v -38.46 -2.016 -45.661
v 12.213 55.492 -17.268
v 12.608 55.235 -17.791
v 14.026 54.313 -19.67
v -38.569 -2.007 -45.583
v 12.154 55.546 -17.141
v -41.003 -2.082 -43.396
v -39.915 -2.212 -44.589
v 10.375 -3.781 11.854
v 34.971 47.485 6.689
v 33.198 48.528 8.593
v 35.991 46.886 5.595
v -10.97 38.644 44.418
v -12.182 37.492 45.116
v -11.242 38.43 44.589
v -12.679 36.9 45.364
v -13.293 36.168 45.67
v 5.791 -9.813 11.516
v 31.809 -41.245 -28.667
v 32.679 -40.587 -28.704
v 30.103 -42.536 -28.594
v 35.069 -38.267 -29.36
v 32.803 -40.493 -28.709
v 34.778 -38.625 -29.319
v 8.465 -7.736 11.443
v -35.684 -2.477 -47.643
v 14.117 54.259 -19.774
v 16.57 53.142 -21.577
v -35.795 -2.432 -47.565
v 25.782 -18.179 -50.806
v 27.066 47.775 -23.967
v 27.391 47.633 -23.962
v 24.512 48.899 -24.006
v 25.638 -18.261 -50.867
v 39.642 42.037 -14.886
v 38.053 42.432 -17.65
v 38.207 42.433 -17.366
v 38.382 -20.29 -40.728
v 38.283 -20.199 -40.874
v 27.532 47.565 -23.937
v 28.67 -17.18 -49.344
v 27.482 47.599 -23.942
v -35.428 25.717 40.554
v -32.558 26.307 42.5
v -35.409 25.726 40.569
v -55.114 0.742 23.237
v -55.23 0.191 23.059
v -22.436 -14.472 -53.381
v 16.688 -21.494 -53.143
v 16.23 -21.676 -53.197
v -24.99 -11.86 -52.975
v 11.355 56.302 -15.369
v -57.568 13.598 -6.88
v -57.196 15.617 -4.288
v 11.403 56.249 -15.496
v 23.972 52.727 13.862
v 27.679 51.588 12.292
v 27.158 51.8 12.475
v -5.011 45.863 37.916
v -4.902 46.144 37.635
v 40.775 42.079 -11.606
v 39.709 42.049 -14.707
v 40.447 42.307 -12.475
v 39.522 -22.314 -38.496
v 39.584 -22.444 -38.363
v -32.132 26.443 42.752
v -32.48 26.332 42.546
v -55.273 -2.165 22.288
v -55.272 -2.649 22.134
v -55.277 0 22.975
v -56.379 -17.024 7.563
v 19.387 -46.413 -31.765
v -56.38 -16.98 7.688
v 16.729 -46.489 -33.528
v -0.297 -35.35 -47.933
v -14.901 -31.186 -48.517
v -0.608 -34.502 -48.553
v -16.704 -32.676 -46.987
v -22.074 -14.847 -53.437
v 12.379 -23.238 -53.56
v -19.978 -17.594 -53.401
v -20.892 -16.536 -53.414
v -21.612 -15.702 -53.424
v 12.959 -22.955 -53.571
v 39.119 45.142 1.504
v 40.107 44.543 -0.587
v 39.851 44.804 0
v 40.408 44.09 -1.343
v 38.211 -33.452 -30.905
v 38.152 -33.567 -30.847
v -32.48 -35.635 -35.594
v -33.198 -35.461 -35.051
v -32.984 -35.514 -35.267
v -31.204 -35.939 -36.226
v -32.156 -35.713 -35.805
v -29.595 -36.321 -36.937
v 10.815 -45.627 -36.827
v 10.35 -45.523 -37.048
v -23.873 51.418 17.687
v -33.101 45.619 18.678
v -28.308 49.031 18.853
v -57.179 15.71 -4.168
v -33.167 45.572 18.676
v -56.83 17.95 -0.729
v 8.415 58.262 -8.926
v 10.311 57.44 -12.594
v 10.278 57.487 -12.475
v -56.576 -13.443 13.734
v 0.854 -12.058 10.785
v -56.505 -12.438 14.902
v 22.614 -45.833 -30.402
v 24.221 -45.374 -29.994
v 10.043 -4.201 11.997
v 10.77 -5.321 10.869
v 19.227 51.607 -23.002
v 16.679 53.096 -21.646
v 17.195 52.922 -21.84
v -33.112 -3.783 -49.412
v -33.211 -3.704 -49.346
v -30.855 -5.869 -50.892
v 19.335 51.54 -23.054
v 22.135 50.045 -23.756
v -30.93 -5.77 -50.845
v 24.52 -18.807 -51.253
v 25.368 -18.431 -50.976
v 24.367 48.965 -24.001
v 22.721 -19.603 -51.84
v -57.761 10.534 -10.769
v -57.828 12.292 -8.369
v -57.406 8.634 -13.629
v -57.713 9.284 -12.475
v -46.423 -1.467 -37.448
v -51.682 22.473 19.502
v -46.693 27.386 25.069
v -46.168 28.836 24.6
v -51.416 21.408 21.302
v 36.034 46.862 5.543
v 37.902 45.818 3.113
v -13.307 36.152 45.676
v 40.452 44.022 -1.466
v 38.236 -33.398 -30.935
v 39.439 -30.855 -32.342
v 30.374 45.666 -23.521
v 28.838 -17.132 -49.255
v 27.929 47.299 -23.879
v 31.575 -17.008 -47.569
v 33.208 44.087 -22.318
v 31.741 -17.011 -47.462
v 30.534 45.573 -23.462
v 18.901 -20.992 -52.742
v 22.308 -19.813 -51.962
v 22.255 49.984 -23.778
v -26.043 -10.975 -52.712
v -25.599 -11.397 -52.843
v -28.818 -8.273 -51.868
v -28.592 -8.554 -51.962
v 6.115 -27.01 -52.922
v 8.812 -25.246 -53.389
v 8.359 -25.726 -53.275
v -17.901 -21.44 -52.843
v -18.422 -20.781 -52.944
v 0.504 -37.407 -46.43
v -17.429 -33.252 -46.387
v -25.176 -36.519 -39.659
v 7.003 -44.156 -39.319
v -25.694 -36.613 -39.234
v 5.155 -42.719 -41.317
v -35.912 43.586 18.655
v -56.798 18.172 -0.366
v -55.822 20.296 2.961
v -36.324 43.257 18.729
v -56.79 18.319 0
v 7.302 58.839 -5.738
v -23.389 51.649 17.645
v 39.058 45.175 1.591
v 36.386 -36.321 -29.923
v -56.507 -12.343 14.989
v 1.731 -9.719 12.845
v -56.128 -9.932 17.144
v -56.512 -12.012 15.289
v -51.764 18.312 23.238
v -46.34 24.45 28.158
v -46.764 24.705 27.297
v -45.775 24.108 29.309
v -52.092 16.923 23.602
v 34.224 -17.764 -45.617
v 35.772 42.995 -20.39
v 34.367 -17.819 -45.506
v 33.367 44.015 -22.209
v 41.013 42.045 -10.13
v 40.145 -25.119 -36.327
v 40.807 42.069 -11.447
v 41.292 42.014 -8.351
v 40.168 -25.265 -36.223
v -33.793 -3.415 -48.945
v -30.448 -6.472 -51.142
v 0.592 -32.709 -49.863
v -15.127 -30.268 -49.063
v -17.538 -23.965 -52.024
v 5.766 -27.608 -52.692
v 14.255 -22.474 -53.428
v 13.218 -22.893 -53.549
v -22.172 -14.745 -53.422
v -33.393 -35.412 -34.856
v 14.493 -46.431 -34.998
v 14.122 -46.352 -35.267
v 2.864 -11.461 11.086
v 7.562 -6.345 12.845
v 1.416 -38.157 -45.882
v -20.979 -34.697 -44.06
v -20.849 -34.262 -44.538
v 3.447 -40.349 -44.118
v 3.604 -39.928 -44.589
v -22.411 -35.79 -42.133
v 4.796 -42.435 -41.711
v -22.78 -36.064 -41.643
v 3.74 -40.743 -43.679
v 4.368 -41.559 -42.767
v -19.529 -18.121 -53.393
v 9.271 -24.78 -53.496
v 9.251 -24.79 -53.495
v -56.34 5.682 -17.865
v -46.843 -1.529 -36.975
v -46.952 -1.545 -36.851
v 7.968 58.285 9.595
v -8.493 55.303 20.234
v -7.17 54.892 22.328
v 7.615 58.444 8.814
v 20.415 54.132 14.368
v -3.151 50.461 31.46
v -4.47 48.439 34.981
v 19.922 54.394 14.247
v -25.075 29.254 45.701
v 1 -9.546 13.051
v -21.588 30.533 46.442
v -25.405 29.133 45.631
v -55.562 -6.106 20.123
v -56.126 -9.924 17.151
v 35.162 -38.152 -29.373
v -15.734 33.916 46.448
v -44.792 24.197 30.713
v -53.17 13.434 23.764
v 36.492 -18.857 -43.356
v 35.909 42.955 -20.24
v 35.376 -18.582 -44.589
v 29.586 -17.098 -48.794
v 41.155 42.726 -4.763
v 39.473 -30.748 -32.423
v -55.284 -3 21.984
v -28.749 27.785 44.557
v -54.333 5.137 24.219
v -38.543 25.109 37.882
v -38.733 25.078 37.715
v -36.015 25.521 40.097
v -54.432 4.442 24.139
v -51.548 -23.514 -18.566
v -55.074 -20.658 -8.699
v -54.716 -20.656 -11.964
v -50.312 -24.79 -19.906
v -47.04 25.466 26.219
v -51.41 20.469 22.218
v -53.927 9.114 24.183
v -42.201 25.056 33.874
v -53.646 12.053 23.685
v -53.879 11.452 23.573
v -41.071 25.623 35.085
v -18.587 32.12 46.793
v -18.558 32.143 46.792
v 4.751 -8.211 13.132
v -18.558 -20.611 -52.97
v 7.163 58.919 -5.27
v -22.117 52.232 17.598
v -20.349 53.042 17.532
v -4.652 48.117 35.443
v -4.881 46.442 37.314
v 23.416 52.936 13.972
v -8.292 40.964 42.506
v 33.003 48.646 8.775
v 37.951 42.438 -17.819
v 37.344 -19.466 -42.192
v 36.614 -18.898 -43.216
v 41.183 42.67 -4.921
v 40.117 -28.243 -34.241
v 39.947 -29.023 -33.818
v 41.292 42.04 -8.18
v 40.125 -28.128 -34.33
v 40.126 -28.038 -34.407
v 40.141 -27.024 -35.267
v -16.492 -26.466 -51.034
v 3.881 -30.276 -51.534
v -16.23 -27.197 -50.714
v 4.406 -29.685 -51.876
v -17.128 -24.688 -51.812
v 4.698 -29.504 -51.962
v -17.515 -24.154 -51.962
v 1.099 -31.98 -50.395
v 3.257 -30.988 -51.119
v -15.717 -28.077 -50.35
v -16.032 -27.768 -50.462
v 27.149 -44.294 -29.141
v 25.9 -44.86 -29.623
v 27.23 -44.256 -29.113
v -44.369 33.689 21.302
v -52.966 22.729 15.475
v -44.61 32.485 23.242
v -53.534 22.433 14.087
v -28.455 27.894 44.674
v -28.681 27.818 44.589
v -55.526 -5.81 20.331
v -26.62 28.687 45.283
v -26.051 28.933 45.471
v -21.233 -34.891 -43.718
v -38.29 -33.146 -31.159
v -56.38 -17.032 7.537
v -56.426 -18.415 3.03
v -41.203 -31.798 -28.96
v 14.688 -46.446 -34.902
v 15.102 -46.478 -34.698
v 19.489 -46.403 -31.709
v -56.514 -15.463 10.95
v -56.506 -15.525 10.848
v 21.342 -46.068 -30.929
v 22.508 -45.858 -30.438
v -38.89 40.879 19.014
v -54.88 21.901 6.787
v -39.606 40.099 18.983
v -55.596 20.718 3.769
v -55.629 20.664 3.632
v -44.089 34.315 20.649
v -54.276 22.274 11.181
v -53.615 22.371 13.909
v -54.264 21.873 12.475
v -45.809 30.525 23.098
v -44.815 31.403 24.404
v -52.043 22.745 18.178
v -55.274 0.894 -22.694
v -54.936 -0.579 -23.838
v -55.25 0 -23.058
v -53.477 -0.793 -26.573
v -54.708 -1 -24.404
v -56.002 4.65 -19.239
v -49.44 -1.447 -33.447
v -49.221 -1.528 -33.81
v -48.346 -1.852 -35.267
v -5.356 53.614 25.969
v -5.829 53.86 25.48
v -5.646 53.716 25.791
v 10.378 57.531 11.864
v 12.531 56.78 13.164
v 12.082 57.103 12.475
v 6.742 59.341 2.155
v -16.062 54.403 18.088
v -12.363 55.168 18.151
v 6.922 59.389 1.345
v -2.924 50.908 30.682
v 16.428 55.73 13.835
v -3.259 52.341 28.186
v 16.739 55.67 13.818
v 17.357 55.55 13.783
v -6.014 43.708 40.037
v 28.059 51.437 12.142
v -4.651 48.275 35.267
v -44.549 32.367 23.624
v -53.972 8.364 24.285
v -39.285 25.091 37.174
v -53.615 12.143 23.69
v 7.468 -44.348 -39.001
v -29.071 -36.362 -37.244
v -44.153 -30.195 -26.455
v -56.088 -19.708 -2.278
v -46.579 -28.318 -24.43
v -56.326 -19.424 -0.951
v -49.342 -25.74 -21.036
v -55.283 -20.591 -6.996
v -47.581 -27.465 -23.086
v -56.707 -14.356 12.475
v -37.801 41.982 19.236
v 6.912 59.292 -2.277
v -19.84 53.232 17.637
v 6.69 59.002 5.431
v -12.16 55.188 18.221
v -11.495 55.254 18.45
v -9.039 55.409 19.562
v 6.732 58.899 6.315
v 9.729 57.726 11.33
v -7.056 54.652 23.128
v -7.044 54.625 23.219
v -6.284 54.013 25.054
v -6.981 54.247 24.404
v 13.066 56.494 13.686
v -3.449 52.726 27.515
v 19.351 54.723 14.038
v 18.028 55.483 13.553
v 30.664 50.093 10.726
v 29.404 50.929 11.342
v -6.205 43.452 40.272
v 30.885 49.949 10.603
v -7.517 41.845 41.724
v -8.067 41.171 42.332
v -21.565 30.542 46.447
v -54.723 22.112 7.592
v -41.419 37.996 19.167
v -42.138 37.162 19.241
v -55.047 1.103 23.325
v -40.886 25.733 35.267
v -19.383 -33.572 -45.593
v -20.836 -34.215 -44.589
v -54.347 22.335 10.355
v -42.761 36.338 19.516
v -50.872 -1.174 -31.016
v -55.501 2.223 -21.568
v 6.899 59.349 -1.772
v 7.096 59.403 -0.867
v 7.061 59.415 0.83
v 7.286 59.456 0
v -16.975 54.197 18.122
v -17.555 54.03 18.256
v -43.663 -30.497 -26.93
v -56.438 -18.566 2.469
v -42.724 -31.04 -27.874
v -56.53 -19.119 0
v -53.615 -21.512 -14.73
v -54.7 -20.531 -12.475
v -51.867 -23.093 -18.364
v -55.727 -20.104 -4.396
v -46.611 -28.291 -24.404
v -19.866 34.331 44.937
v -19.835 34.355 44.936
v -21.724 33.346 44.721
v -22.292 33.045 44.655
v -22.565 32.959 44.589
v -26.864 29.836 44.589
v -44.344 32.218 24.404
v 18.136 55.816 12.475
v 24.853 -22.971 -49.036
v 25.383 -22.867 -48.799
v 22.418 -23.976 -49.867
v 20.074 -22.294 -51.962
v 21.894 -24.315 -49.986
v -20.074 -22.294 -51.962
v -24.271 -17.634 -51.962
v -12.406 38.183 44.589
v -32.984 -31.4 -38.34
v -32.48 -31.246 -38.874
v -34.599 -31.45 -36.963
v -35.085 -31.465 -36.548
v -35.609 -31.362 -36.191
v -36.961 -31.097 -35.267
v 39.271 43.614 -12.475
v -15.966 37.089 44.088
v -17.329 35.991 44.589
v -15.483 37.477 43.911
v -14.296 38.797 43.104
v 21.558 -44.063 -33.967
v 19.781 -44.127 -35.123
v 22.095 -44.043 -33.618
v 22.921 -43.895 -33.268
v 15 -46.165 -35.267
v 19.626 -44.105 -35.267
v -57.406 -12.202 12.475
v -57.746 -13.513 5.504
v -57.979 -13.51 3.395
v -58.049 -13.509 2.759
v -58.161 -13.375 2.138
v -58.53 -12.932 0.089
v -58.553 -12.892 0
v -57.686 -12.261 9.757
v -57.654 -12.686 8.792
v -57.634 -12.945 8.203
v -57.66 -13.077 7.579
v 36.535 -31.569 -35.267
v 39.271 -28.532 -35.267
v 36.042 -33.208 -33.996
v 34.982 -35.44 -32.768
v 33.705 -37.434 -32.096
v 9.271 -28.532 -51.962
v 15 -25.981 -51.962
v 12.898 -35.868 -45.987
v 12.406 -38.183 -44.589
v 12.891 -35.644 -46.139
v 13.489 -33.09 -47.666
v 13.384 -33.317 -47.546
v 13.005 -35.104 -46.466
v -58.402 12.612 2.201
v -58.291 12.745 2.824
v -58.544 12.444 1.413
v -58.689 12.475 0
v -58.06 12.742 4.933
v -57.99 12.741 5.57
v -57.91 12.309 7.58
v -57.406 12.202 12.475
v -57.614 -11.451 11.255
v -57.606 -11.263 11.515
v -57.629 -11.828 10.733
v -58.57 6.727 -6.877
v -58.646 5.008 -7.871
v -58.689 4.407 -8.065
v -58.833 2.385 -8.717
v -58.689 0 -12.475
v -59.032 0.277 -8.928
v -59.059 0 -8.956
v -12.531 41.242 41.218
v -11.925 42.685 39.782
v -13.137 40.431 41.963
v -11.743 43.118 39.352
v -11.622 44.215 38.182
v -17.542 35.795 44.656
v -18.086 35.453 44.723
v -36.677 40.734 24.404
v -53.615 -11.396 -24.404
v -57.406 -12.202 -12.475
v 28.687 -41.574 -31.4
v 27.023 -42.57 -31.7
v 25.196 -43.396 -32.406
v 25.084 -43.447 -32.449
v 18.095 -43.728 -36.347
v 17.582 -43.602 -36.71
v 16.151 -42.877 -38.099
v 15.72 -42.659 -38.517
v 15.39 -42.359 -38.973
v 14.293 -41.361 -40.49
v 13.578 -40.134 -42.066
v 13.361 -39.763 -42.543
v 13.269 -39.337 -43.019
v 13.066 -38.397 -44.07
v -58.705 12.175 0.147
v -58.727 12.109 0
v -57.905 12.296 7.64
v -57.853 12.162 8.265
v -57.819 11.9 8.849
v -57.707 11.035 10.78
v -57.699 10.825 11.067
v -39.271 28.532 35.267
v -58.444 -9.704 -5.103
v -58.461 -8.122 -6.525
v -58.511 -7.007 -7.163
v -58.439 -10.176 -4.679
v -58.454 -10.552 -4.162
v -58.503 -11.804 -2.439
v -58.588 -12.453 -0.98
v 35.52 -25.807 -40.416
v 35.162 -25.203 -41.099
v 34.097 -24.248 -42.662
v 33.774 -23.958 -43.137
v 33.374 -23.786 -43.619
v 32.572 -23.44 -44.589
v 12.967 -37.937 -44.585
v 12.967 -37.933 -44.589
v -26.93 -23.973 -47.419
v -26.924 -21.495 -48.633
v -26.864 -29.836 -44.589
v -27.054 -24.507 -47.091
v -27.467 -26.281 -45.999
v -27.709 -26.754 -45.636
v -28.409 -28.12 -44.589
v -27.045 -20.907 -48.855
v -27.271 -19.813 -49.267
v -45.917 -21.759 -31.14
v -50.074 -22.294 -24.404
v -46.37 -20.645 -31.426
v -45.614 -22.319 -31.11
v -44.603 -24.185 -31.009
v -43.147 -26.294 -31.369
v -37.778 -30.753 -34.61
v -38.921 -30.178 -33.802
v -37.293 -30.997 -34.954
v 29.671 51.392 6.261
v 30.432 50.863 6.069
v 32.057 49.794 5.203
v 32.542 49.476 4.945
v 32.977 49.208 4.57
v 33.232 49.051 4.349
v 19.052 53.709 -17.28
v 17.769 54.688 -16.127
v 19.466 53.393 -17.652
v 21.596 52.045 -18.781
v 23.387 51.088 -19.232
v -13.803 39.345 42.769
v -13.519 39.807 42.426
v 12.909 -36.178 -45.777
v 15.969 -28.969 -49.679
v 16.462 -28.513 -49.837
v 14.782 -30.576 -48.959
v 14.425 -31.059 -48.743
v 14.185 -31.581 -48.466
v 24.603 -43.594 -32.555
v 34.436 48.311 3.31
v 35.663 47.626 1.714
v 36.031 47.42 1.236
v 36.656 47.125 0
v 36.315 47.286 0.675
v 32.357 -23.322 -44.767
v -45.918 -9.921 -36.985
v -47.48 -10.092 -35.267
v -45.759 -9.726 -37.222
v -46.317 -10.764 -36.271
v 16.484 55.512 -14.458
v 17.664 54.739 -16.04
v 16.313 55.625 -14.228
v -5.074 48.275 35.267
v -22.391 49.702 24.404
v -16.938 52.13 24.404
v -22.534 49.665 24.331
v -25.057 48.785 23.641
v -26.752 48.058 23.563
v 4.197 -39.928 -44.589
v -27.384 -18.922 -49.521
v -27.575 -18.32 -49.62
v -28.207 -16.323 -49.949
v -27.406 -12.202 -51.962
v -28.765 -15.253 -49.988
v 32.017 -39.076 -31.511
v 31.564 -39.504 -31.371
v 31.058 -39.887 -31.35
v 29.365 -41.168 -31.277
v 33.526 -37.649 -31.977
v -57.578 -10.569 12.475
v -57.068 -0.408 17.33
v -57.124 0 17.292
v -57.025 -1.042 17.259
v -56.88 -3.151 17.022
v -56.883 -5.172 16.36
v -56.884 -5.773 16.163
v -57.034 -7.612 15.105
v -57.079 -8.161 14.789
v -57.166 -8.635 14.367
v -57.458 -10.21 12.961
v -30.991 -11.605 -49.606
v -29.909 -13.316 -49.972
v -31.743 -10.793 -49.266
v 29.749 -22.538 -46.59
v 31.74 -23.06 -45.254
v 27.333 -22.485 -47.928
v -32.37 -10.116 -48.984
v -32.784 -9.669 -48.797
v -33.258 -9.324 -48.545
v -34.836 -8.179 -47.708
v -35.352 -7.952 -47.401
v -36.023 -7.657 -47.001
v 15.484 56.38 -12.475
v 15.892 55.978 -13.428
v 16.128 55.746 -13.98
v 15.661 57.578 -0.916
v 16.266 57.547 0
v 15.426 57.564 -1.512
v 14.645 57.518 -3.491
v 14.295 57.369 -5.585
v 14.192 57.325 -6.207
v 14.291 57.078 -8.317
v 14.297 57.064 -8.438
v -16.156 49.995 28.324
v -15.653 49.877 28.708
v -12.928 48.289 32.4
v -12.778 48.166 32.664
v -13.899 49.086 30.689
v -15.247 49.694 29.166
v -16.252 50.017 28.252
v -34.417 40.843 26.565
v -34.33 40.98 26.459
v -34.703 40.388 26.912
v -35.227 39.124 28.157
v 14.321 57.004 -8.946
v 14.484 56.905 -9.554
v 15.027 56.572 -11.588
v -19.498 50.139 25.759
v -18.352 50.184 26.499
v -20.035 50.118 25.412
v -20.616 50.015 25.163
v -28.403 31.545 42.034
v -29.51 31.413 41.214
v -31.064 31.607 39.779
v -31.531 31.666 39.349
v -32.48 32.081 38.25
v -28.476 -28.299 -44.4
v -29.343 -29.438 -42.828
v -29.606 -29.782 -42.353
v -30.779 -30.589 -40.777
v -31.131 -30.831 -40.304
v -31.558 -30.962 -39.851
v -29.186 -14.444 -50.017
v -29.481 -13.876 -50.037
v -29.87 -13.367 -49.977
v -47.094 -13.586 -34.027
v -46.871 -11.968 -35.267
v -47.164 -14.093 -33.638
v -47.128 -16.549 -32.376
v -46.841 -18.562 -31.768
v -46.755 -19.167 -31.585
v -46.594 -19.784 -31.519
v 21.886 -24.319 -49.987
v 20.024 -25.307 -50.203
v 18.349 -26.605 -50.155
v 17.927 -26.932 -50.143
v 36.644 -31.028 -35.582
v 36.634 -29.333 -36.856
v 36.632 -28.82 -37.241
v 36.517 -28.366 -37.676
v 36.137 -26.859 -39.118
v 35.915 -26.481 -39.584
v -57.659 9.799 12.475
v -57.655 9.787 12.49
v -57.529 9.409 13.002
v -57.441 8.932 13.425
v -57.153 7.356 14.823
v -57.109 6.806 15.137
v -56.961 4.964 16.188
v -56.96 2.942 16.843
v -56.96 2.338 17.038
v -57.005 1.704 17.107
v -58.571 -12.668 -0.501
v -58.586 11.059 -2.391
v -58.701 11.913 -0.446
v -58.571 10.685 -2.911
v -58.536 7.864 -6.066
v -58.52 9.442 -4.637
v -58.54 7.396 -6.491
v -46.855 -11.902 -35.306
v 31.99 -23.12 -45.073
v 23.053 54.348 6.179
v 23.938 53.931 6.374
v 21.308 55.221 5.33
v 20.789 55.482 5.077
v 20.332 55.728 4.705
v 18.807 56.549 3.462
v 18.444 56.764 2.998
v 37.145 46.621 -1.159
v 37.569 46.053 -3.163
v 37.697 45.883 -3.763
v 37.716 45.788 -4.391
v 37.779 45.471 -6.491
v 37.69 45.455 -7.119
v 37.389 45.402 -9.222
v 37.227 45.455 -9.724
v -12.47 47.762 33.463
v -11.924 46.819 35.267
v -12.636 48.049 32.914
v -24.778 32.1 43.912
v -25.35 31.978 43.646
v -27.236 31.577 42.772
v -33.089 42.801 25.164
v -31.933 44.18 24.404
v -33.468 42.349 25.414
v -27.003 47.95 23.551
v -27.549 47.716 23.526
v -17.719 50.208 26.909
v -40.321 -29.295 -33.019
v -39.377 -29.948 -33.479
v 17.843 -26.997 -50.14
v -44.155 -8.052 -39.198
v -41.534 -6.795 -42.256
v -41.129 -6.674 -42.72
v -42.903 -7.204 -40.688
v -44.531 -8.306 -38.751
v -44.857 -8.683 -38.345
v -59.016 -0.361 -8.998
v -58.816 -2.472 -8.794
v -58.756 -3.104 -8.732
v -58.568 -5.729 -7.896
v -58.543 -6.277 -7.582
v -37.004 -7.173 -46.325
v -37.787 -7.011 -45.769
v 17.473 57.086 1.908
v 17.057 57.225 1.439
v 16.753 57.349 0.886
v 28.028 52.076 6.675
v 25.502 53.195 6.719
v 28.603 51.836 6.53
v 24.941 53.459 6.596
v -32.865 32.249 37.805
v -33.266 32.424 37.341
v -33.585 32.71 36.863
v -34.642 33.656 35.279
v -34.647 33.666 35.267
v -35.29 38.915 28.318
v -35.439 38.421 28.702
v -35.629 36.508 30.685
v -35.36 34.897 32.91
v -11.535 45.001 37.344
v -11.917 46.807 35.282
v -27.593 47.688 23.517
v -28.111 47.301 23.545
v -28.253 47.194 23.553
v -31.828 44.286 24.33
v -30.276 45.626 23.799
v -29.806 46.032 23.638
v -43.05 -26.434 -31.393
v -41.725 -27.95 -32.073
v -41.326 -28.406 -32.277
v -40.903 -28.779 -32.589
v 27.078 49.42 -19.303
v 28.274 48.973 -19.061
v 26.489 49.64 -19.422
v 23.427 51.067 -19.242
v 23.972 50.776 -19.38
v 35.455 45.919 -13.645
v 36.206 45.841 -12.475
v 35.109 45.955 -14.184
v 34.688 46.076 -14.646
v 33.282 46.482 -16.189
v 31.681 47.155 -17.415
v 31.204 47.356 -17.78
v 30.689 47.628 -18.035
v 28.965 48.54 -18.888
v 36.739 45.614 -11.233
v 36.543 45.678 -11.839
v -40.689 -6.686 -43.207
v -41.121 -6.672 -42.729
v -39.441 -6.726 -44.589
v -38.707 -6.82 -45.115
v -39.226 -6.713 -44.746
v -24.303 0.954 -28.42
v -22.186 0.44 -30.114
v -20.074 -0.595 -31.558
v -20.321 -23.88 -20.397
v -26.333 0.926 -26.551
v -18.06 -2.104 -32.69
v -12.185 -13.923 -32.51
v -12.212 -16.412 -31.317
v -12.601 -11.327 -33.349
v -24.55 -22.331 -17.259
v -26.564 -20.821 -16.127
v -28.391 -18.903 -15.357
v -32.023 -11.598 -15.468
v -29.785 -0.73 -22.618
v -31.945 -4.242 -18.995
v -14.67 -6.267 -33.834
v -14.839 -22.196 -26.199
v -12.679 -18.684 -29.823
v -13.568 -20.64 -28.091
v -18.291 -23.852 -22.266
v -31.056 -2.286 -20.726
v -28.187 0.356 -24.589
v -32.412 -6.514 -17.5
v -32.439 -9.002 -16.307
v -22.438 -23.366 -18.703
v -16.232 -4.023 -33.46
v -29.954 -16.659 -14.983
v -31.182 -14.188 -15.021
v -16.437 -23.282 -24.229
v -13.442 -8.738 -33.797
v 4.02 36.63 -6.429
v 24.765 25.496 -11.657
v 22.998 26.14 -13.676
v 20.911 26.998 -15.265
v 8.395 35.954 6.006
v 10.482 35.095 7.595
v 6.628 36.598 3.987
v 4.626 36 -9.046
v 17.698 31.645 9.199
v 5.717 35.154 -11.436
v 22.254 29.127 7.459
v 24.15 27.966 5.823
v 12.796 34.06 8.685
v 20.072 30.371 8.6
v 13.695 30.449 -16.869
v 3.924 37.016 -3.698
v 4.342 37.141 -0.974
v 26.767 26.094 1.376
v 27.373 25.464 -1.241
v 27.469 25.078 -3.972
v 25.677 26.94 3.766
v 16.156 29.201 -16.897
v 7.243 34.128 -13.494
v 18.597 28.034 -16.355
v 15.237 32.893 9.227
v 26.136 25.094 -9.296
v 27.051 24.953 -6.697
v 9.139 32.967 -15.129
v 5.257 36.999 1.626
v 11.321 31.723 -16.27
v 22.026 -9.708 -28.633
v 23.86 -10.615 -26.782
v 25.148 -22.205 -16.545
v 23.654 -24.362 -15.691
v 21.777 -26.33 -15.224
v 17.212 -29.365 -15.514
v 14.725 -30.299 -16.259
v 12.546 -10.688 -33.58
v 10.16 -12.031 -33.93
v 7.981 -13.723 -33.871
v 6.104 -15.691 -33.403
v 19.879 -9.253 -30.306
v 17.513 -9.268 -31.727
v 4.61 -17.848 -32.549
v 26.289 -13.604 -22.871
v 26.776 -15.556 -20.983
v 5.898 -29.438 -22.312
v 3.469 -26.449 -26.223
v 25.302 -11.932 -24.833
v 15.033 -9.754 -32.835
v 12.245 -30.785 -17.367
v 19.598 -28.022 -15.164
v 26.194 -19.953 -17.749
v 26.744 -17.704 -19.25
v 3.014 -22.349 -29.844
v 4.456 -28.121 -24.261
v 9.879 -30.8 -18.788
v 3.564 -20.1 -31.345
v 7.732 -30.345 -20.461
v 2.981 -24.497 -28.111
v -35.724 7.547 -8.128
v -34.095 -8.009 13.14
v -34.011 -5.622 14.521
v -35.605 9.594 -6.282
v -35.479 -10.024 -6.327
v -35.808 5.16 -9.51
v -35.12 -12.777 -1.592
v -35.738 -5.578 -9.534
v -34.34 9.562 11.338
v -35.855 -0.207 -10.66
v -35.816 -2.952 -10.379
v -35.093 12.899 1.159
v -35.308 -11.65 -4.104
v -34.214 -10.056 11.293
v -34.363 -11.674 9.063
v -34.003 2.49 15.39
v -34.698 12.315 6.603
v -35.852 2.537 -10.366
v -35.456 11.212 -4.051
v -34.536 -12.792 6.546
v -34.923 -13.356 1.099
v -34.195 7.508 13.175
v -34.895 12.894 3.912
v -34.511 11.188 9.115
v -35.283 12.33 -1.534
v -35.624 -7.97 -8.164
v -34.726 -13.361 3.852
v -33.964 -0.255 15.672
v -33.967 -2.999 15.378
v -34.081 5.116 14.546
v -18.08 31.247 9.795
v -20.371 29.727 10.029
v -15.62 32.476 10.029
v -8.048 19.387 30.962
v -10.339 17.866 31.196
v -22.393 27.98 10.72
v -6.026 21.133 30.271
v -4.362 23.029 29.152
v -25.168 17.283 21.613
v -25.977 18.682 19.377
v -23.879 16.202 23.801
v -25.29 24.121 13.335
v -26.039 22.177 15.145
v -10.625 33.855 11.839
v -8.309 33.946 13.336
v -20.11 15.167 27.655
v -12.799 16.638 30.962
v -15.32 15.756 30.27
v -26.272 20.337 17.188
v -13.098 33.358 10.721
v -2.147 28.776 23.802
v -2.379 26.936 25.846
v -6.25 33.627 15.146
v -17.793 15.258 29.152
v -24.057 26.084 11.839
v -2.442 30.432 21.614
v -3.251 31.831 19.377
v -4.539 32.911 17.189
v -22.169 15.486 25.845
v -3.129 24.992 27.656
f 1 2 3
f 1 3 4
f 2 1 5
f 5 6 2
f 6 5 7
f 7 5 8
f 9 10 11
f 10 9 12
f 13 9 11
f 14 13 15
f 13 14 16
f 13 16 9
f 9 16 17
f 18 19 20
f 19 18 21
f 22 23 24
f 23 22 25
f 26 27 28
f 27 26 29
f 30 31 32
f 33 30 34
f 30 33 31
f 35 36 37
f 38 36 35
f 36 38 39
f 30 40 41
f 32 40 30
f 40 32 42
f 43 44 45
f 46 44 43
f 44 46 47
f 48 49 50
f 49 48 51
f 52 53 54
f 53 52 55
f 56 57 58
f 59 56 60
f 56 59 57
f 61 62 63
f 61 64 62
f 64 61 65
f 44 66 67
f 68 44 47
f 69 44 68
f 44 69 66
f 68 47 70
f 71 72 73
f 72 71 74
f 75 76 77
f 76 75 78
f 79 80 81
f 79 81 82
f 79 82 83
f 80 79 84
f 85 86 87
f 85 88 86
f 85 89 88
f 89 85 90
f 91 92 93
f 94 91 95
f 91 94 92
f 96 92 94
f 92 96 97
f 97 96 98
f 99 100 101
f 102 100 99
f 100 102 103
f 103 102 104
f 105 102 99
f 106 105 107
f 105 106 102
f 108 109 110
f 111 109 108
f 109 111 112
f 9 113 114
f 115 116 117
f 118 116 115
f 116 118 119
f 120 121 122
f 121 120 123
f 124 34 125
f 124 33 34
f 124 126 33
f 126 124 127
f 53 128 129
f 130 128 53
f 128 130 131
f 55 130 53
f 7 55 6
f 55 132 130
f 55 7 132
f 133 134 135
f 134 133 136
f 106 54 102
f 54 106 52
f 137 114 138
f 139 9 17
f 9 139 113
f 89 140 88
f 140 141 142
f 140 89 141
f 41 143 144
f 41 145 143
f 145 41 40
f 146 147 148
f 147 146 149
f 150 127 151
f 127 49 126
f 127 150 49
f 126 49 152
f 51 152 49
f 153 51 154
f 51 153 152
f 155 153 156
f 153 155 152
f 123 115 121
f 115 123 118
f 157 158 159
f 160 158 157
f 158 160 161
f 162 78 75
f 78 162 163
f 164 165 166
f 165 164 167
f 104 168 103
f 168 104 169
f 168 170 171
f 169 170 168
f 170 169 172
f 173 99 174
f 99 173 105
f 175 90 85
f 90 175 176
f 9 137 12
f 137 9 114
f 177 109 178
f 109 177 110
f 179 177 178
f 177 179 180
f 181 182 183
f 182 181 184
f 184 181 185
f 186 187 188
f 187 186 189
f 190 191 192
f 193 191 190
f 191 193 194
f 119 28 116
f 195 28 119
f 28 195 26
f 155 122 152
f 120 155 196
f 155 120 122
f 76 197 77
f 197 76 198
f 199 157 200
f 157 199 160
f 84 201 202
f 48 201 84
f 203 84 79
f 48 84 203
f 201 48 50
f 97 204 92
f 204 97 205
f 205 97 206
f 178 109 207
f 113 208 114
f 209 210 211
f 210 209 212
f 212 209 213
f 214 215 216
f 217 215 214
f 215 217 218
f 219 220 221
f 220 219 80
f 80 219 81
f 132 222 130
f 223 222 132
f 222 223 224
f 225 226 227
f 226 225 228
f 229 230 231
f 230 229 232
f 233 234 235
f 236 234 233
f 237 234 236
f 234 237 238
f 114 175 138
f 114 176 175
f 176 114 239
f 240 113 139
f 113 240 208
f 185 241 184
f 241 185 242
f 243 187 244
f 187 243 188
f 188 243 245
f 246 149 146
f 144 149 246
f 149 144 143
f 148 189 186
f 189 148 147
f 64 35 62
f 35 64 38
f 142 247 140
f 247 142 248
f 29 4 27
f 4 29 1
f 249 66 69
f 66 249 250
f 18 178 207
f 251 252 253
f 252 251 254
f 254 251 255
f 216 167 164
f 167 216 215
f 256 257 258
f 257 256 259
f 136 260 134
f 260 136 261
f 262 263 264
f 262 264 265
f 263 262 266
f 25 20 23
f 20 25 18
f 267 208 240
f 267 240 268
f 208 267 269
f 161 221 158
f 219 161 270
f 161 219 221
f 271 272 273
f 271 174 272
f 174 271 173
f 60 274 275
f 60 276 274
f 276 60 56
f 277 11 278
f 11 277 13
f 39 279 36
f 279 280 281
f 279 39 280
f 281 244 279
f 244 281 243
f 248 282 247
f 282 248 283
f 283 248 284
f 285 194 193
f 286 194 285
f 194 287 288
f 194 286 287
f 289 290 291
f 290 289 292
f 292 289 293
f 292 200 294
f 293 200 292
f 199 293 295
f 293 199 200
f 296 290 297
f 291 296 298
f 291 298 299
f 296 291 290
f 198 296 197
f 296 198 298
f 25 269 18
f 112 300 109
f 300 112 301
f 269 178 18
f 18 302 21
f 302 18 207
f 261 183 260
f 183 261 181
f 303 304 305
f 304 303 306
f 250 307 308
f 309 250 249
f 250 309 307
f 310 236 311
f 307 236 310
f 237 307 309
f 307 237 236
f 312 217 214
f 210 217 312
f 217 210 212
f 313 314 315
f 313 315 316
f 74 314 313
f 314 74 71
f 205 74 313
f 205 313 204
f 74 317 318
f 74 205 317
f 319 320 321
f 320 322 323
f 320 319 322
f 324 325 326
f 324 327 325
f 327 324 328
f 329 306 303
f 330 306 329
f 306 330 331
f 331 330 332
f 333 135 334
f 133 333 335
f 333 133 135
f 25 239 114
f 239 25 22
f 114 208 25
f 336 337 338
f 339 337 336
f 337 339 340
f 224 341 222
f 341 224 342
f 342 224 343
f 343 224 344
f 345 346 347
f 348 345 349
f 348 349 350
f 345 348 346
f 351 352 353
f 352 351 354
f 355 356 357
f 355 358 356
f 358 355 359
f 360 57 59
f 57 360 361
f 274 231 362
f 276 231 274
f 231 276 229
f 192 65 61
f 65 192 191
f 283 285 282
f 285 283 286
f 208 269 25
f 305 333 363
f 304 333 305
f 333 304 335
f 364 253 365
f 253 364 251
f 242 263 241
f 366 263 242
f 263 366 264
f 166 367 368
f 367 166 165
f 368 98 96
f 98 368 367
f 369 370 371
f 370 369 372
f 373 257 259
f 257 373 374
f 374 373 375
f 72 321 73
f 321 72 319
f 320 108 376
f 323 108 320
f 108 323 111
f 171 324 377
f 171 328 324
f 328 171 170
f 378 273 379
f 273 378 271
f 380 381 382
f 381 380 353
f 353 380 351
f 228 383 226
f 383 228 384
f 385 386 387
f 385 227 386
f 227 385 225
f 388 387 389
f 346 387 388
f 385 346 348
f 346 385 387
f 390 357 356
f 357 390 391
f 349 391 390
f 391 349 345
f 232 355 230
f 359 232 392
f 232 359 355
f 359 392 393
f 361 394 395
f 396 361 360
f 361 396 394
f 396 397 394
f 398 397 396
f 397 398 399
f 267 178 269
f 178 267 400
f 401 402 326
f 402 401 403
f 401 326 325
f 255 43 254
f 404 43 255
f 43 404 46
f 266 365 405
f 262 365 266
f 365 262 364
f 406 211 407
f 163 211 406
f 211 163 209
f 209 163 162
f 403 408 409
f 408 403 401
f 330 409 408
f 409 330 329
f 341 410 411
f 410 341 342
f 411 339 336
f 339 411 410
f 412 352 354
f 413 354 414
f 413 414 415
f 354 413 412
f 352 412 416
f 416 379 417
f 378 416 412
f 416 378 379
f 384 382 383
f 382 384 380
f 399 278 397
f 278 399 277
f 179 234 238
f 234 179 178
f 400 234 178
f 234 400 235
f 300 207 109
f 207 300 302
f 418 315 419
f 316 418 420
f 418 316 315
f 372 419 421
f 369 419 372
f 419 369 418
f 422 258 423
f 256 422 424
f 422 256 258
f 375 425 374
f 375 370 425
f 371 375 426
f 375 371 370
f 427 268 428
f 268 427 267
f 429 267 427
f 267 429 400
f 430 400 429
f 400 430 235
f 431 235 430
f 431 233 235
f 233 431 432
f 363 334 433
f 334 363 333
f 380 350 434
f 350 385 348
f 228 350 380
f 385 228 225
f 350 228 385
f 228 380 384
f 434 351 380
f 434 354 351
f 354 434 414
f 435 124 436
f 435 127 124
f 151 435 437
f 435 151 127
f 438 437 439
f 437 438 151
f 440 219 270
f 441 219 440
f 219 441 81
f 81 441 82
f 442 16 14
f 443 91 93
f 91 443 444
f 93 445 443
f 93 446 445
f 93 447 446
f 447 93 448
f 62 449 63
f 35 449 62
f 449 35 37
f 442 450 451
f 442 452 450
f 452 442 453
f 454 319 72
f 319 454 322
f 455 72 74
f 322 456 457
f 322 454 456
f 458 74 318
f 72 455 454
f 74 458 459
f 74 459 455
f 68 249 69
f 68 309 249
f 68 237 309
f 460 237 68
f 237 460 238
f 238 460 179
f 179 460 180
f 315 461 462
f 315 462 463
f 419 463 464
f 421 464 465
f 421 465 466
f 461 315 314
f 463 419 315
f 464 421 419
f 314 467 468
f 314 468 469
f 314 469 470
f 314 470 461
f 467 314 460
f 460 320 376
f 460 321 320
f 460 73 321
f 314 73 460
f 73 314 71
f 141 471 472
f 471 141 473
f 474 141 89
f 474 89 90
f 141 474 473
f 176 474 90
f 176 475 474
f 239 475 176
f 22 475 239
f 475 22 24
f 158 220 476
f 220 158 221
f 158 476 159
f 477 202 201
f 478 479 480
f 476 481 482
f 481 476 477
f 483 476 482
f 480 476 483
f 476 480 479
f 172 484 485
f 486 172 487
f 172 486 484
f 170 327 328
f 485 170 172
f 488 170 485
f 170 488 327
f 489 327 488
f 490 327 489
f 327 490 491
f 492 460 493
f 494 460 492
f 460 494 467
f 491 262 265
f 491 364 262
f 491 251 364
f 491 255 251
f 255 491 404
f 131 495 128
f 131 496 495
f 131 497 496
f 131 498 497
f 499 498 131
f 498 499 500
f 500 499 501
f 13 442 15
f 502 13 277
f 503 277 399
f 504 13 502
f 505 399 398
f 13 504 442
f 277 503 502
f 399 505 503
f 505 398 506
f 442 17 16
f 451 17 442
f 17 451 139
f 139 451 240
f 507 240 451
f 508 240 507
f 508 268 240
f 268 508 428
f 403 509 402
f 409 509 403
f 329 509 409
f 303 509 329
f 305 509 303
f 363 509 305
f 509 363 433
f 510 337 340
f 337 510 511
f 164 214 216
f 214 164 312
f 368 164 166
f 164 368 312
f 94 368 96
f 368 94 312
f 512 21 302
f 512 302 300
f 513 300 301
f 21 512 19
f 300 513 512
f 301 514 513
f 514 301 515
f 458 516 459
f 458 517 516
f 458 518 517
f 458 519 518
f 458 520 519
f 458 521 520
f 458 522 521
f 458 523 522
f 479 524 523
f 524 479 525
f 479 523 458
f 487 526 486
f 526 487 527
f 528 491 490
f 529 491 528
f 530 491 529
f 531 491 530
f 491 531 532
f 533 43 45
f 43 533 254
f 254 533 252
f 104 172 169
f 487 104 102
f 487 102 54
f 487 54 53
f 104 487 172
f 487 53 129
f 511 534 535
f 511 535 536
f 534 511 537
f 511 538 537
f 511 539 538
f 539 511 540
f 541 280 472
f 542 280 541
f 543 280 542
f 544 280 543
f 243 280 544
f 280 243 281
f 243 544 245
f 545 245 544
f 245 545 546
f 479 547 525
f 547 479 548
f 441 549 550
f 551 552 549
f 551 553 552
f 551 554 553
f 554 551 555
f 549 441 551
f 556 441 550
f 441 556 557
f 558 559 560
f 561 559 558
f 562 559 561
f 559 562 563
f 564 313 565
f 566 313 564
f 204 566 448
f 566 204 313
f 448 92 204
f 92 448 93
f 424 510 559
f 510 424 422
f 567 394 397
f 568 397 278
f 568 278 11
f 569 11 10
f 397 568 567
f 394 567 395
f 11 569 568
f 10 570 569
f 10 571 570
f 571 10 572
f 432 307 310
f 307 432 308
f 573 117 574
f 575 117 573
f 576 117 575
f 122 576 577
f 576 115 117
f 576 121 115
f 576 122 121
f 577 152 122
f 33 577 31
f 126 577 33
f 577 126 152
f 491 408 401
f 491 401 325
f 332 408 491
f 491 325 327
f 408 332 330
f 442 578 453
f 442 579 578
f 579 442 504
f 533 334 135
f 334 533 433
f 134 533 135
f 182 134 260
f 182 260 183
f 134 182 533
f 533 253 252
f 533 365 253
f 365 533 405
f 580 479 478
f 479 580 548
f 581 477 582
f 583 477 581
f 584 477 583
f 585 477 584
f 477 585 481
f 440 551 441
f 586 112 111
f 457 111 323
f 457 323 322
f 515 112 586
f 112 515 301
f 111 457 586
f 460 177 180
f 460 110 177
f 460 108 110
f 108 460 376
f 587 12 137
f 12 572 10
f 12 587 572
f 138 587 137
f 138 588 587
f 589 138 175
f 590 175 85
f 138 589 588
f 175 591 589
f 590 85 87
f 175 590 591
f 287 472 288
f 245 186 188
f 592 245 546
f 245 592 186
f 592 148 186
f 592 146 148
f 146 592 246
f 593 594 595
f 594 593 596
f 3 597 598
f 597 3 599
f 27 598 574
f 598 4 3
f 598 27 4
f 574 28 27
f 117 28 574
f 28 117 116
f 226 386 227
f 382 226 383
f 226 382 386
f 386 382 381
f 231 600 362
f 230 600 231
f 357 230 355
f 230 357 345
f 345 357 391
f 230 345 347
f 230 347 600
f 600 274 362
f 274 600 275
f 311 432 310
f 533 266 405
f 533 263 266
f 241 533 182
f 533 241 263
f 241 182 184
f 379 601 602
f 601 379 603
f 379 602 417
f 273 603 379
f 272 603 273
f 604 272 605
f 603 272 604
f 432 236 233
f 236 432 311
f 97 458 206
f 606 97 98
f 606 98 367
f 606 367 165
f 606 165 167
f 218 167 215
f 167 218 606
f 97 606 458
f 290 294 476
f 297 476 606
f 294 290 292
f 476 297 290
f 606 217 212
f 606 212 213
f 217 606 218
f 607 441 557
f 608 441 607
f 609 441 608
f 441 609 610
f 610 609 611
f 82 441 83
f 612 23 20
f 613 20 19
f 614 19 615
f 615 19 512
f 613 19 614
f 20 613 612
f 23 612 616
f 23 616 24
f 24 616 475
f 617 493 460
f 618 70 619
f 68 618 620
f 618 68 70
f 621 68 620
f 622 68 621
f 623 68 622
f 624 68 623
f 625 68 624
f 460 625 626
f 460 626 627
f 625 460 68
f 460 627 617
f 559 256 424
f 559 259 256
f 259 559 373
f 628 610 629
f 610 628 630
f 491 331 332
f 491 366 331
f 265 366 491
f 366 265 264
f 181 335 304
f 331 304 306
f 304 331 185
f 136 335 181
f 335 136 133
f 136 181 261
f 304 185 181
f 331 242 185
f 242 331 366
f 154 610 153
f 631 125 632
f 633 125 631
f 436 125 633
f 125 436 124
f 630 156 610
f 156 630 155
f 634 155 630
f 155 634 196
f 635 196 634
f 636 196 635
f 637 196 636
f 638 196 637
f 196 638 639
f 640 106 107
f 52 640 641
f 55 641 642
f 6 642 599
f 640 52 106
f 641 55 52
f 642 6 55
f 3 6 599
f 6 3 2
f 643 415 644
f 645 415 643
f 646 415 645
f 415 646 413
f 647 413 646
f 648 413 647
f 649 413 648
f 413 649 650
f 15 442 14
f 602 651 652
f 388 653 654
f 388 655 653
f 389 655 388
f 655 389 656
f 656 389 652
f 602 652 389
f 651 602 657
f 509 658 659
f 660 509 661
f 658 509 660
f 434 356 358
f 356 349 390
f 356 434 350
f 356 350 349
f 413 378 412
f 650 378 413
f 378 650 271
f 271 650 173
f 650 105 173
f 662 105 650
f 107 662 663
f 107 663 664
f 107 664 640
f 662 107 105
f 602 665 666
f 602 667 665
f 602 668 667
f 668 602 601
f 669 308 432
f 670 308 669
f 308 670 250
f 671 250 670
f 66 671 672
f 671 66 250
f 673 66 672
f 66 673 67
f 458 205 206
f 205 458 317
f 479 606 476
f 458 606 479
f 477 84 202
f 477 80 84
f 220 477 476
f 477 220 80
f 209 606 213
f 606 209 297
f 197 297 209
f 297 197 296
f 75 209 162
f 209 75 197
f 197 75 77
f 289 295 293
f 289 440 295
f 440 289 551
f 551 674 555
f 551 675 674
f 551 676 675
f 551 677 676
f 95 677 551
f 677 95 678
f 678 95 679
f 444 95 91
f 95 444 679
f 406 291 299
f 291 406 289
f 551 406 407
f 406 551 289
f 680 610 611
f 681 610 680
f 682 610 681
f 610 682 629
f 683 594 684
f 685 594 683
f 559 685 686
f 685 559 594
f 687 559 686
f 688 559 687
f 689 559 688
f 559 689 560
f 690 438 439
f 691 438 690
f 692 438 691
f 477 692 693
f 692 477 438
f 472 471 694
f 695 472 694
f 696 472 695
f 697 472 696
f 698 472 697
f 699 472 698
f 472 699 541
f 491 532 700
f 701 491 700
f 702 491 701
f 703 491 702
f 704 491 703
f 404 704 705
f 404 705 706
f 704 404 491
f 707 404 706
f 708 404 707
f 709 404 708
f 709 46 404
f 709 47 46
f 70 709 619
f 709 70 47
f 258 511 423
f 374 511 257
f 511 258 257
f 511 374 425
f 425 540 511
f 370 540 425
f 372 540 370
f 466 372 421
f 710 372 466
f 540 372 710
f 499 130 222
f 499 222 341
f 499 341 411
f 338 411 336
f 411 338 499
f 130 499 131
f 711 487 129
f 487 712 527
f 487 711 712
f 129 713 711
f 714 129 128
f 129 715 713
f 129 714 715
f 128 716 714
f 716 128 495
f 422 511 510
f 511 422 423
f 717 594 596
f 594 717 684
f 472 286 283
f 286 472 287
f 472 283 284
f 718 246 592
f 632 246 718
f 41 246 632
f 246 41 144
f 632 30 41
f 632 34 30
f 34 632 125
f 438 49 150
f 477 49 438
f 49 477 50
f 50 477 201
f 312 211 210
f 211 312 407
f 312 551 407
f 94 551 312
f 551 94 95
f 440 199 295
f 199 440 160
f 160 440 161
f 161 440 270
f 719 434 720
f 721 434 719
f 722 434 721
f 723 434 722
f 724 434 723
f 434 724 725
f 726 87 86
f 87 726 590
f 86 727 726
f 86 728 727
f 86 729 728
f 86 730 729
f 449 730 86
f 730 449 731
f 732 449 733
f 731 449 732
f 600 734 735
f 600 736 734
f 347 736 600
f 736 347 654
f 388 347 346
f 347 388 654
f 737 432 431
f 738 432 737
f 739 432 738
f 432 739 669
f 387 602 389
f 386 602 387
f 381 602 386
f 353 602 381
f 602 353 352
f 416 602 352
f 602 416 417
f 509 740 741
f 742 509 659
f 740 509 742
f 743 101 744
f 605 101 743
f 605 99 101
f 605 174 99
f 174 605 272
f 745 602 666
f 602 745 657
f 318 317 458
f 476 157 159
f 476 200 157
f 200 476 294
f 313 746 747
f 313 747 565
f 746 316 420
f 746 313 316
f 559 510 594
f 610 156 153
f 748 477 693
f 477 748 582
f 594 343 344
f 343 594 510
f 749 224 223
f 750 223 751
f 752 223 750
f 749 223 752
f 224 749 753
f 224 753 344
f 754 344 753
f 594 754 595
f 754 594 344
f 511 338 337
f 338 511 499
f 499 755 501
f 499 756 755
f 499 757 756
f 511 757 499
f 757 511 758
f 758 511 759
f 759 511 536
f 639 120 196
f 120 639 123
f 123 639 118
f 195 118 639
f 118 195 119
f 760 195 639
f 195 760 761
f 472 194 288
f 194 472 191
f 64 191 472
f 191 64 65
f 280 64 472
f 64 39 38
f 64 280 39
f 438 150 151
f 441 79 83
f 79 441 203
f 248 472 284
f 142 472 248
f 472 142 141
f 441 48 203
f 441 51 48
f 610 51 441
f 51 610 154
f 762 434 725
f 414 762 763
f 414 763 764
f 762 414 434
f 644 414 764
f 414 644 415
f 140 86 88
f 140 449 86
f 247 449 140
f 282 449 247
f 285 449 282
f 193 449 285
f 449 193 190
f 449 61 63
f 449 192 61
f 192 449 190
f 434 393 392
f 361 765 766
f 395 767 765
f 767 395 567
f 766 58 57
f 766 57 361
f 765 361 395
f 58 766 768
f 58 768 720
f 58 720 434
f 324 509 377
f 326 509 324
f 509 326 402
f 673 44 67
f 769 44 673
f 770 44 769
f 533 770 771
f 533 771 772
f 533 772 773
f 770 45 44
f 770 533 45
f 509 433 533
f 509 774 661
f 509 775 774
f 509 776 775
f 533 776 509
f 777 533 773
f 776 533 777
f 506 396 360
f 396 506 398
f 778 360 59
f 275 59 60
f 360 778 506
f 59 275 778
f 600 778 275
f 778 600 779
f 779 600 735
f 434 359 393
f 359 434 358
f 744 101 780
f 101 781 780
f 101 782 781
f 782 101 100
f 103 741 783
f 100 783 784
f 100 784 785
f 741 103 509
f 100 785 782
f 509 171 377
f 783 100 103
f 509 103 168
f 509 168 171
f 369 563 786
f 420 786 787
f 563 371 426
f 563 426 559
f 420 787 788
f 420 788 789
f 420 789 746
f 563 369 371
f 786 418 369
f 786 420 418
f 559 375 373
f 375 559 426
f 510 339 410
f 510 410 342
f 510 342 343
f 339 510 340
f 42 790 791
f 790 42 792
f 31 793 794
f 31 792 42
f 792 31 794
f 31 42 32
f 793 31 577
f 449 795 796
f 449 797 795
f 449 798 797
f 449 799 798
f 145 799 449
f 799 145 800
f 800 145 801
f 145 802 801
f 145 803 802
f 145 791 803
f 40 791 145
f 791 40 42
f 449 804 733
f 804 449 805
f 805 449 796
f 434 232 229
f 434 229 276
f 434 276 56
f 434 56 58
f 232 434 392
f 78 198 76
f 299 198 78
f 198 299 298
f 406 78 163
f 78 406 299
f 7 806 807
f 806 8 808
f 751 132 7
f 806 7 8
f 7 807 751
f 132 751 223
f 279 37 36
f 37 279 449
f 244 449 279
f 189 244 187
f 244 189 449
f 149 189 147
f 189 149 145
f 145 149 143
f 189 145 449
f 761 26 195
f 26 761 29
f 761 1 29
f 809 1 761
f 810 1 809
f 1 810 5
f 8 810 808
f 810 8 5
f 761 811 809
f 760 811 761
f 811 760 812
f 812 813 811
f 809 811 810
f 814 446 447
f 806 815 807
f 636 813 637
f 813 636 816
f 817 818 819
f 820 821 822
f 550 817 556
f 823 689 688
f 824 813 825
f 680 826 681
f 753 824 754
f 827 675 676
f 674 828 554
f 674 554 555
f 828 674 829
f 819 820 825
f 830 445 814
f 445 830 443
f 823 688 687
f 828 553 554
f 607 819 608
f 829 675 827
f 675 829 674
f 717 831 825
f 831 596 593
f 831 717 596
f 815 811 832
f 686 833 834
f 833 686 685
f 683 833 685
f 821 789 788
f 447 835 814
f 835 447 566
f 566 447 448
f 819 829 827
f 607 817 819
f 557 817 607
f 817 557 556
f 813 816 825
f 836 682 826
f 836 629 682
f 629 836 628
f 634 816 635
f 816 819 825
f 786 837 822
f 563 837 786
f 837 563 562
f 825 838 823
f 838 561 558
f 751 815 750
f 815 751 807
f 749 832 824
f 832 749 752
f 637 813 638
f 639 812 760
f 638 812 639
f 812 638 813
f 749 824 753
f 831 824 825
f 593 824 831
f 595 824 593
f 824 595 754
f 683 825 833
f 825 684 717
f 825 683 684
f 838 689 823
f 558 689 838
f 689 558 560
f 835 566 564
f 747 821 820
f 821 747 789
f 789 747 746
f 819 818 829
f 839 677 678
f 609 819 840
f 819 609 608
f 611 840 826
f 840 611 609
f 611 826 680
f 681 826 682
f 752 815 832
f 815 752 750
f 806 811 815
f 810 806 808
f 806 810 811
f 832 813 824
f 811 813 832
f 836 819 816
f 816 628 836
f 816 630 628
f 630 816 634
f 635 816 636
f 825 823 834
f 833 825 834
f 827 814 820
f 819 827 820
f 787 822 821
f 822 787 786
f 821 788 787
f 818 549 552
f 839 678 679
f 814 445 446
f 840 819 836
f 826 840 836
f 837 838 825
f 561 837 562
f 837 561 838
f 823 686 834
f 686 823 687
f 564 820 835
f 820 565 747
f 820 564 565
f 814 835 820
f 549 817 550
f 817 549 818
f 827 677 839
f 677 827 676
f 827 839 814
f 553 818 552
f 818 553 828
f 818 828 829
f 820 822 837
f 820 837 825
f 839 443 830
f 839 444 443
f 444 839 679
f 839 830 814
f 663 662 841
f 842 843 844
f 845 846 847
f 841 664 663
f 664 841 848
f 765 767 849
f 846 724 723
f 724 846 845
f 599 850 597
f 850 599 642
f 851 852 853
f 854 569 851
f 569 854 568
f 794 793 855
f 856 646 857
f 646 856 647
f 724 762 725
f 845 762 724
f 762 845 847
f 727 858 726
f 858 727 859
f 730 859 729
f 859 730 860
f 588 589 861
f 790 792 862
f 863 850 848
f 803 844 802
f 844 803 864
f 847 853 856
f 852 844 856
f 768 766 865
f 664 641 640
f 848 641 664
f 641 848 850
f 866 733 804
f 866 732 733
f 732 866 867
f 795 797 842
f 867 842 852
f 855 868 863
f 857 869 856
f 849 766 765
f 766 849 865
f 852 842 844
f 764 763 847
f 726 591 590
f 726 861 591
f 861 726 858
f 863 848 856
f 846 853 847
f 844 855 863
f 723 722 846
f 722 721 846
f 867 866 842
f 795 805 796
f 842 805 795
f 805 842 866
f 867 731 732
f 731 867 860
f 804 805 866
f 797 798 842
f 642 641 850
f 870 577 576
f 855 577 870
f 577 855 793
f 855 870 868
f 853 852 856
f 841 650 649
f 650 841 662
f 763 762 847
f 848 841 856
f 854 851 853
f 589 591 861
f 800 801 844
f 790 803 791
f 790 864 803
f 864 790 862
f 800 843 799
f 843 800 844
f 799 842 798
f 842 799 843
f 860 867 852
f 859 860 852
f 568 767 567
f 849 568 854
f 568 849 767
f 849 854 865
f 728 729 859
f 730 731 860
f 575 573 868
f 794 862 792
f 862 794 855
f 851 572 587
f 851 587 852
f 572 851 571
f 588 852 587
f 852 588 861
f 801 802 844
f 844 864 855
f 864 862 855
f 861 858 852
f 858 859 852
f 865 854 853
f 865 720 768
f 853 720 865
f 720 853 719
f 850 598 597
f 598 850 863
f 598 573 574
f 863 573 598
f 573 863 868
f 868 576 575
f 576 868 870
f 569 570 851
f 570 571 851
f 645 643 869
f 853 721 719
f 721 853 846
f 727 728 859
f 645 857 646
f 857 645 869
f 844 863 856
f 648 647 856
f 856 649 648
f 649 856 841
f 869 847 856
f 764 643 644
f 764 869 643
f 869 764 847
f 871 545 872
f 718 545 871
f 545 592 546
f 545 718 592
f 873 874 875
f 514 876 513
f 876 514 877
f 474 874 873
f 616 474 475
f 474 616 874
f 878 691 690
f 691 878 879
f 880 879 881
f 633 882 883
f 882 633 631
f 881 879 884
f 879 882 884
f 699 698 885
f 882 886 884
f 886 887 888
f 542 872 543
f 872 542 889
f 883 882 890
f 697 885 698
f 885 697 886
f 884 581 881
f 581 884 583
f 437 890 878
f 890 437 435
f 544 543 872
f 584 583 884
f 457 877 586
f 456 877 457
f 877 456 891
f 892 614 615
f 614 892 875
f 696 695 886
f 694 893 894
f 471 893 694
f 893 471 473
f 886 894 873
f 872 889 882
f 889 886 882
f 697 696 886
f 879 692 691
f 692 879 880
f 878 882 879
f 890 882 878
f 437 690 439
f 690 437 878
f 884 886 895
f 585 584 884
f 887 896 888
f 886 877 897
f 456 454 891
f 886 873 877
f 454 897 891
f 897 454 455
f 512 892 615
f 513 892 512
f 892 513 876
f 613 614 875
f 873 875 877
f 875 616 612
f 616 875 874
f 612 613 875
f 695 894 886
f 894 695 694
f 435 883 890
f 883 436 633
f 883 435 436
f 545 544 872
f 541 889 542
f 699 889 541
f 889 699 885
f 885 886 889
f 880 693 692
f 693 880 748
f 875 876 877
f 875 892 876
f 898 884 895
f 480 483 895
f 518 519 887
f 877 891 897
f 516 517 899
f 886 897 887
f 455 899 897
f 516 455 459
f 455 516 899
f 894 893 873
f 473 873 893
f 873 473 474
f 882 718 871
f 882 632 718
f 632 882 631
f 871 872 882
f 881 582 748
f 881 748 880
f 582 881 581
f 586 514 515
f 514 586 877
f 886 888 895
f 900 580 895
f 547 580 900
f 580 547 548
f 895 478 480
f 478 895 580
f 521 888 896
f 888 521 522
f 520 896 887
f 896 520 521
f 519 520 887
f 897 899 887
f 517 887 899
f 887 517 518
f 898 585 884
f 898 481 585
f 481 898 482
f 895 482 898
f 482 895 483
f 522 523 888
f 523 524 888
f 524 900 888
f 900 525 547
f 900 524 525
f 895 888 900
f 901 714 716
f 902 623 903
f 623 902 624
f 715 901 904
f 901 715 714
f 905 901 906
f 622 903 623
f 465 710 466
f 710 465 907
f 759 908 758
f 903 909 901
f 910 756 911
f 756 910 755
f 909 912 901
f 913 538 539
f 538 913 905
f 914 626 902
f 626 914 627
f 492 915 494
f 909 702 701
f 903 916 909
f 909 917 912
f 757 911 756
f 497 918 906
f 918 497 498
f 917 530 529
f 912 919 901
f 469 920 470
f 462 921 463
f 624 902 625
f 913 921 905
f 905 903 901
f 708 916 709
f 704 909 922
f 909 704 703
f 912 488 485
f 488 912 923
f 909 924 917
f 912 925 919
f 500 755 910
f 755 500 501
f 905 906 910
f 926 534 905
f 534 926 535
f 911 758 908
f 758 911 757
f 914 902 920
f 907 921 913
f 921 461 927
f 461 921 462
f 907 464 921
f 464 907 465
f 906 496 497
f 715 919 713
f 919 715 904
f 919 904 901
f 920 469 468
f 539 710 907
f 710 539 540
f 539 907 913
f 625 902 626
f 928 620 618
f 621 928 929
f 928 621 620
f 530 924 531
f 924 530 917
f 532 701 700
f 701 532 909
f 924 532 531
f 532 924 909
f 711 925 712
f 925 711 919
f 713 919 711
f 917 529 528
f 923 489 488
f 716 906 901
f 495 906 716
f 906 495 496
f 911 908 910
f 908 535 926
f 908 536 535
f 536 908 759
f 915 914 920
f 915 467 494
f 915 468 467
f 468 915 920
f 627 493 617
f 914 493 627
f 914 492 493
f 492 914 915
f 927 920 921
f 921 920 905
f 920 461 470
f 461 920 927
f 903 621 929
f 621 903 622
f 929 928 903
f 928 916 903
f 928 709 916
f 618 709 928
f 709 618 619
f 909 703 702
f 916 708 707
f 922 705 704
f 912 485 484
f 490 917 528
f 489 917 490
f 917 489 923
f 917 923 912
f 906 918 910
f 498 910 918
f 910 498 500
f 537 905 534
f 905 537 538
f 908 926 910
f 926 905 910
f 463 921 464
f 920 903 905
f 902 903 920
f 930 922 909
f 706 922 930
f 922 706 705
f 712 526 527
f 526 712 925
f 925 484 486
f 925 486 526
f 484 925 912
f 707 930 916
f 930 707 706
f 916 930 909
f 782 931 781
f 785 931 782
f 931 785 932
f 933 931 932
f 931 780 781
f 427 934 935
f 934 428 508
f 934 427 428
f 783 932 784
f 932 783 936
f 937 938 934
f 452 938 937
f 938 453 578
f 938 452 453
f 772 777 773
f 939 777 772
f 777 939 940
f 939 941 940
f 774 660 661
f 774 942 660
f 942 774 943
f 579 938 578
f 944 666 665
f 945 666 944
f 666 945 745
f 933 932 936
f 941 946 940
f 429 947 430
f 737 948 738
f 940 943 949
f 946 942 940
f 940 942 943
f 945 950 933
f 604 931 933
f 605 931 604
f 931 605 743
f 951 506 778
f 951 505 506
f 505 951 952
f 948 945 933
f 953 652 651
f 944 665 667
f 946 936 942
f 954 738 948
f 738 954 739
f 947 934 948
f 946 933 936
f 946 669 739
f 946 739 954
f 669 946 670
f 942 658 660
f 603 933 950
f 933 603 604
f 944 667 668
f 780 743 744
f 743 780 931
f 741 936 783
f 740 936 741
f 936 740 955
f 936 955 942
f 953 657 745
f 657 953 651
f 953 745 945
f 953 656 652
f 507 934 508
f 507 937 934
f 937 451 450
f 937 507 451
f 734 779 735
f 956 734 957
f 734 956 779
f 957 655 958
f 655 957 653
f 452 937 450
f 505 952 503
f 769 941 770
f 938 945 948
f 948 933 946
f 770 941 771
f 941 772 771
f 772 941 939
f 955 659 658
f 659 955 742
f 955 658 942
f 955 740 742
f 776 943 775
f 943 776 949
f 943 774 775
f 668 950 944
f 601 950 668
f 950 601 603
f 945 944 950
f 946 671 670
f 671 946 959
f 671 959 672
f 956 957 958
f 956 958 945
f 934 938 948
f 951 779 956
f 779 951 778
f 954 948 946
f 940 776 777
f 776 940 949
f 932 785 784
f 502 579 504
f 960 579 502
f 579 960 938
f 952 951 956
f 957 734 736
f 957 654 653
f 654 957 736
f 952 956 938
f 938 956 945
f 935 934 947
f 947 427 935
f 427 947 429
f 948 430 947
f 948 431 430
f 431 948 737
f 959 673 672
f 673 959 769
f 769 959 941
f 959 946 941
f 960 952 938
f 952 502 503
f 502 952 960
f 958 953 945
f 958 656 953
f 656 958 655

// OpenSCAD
difference() {
	intersection() {
		hull() {
			rotate(a = -118.9051365199, v = [-0.4418015166, -0.7557603411, 0.0000000000]) {
				rotate(a = -90.0000000000, v = [-0.9238795325, -0.3826834324, 0.0000000000]) {
					cylinder(h = 60, r = 16.2000000000);
				}
			}
			rotate(a = -118.9051365199, v = [-0.4418015166, -0.7557603411, 0.0000000000]) {
				rotate(a = -90.0000000000, v = [0.7933533403, -0.6087614290, 0.0000000000]) {
					cylinder(h = 60, r = 16.2000000000);
				}
			}
			rotate(a = -118.9051365199, v = [-0.4418015166, -0.7557603411, 0.0000000000]) {
				rotate(a = -24.0657434263, v = [-0.3911208660, -0.1153809290, 0.0000000000]) {
					cylinder(h = 60, r = 16.2000000000);
				}
			}
			rotate(a = -118.9051365199, v = [-0.4418015166, -0.7557603411, 0.0000000000]) {
				rotate(a = -141.7661142776, v = [-0.6170926551, -0.0469096494, 0.0000000000]) {
					cylinder(h = 60, r = 16.2000000000);
				}
			}
			rotate(a = -118.9051365199, v = [-0.4418015166, -0.7557603411, 0.0000000000]) {
				rotate(a = -154.1384175201, v = [0.4328755604, -0.0537392134, 0.0000000000]) {
					cylinder(h = 60, r = 16.2000000000);
				}
			}
		}
		sphere(r = 60);
	}
	union() {
		rotate(a = -118.9051365199, v = [-0.4418015166, -0.7557603411, 0.0000000000]) {
			rotate(a = -90.0000000000, v = [-0.9238795325, -0.3826834324, 0.0000000000]) {
				translate(v = [0, 0, 35]) {
					cylinder(h = 100, r = 13.2000000000);
				}
			}
		}
		rotate(a = -118.9051365199, v = [-0.4418015166, -0.7557603411, 0.0000000000]) {
			rotate(a = -90.0000000000, v = [0.7933533403, -0.6087614290, 0.0000000000]) {
				translate(v = [0, 0, 35]) {
					cylinder(h = 100, r = 13.2000000000);
				}
			}
		}
		rotate(a = -118.9051365199, v = [-0.4418015166, -0.7557603411, 0.0000000000]) {
			rotate(a = -24.0657434263, v = [-0.3911208660, -0.1153809290, 0.0000000000]) {
				translate(v = [0, 0, 35]) {
					cylinder(h = 100, r = 13.2000000000);
				}
			}
		}
		rotate(a = -118.9051365199, v = [-0.4418015166, -0.7557603411, 0.0000000000]) {
			rotate(a = -141.7661142776, v = [-0.6170926551, -0.0469096494, 0.0000000000]) {
				translate(v = [0, 0, 35]) {
					cylinder(h = 100, r = 13.2000000000);
				}
			}
		}
		rotate(a = -118.9051365199, v = [-0.4418015166, -0.7557603411, 0.0000000000]) {
			rotate(a = -154.1384175201, v = [0.4328755604, -0.0537392134, 0.0000000000]) {
				translate(v = [0, 0, 35]) {
					cylinder(h = 100, r = 13.2000000000);
				}
			}
		}
	}
}
